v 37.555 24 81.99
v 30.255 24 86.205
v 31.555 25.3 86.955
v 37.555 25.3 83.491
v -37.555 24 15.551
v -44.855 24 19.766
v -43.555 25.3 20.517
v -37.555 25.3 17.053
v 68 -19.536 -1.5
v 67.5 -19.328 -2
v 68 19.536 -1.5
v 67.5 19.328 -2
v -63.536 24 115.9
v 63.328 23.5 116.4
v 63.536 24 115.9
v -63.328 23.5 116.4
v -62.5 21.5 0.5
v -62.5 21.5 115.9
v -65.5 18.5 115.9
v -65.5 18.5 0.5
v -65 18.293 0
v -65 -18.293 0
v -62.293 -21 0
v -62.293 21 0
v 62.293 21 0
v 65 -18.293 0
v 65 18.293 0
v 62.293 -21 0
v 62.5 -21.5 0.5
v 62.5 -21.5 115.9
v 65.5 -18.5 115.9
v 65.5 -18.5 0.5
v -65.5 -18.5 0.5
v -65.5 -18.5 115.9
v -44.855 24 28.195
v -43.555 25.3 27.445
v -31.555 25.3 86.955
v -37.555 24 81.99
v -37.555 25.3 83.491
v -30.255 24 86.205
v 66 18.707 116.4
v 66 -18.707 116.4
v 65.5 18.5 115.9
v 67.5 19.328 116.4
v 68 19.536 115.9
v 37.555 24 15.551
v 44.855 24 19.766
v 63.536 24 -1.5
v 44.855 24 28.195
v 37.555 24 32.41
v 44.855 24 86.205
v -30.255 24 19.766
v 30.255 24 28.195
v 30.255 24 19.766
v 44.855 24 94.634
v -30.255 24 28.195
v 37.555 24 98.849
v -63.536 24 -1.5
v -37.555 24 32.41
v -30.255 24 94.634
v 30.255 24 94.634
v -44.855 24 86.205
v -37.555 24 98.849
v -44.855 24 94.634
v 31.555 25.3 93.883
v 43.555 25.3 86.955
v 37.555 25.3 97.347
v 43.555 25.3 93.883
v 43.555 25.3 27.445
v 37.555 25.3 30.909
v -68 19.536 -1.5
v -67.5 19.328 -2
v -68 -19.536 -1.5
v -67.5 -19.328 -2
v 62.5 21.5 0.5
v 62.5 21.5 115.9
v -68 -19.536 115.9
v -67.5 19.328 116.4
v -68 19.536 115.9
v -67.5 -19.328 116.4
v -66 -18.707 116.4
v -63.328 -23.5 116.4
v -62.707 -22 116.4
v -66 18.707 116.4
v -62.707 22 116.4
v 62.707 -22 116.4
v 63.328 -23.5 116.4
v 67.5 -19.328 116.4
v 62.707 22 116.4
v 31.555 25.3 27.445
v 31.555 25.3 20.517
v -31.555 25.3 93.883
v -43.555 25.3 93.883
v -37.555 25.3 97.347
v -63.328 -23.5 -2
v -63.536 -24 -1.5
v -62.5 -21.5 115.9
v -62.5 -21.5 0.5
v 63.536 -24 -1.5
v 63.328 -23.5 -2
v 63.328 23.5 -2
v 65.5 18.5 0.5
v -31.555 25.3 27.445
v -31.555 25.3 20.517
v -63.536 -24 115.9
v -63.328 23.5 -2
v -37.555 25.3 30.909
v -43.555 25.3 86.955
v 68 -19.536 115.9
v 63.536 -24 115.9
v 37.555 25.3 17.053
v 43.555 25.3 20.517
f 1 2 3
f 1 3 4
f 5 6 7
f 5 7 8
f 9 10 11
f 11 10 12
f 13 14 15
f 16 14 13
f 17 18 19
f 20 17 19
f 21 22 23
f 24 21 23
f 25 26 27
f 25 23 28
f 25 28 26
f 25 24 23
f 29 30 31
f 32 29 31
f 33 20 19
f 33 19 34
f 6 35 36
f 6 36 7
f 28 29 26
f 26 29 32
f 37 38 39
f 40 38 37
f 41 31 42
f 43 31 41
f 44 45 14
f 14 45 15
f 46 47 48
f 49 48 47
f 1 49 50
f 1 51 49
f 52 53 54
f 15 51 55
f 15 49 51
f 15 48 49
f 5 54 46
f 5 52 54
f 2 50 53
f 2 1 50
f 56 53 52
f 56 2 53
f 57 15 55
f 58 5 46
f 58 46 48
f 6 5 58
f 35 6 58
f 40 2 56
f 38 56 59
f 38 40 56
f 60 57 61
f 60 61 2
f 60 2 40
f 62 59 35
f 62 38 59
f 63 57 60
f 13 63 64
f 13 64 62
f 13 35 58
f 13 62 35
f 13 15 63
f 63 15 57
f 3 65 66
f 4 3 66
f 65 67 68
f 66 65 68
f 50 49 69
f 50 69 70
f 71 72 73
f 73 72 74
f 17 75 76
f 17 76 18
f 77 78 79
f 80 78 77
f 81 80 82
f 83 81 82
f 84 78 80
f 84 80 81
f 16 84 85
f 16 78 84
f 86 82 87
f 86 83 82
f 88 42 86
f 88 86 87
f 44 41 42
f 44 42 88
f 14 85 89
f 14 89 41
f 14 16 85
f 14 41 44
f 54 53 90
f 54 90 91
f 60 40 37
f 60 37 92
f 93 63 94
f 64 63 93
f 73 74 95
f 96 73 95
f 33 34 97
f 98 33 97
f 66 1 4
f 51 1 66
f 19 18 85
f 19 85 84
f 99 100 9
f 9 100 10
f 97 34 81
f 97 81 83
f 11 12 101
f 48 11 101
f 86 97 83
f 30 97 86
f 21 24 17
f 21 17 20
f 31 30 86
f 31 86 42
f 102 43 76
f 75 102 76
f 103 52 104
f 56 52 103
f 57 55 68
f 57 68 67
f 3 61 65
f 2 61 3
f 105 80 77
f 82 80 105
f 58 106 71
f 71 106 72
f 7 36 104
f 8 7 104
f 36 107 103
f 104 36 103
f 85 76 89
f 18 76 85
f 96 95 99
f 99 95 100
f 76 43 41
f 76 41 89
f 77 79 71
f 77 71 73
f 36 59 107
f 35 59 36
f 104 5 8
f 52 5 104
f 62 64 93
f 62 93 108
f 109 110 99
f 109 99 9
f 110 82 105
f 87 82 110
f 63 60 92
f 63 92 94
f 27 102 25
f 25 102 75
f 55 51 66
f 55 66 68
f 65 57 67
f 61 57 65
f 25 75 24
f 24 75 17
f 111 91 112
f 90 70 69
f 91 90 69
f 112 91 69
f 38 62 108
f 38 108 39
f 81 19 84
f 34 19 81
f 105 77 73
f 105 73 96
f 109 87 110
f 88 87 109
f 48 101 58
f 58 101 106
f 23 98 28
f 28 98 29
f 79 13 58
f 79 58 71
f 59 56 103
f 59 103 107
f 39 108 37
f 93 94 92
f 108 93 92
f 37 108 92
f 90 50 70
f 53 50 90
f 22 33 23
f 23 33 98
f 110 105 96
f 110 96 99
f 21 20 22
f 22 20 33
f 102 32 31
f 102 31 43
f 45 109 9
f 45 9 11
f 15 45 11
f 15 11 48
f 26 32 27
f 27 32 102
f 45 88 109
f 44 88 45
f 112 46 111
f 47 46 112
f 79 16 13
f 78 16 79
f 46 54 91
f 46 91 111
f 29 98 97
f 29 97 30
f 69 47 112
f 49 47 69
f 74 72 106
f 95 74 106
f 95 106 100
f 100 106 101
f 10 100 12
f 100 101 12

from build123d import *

# Parameters (mm, degrees)
WALLS_DEPTH          = 116.4
BACK_PLATE_DEPTH     = 2
DEBURS_SIZE          = 0.5
FEET_DEPTH           = 1.3
FEET_DRAFT           = -45
FEET_PROFILE_2_DEPTH = 1.3
FEET_PROFILE_2_DRAFT = -45
FEET_PROFILE_3_DEPTH = 1.3
FEET_PROFILE_3_DRAFT = -45
FEET_PROFILE_4_DEPTH = 1.3
FEET_PROFILE_4_DRAFT = -45


with BuildPart() as part:
    # Sketch1 → Walls (new body)
    with BuildSketch(Plane.XY):
        Polygon((-68, 19.535533906), (-68, -19.535533906), (-63.535533906, -24), (63.535533906, -24), (68, -19.535533906), (68, 19.535533906), (63.535533906, 24), (-63.535533906, 24), align=None)
        Polygon((-65.5, 18.5), (-65.5, -18.5), (-62.5, -21.5), (62.5, -21.5), (65.5, -18.5), (65.5, 18.5), (62.5, 21.5), (-62.5, 21.5), align=None, mode=Mode.SUBTRACT)
    extrude(amount=WALLS_DEPTH)

    # Sketch2 → Back Plate (add)
    with BuildSketch(Plane.XY):
        Polygon((68, -19.535533906), (68, 19.535533906), (63.535533906, 24), (-63.535533906, 24), (-68, 19.535533906), (-68, -19.535533906), (-63.535533906, -24), (63.535533906, -24), align=None)
    extrude(amount=-BACK_PLATE_DEPTH)

    # Deburs
    deburs_edges = [part.edges().sort_by_distance(p)[0] for p in [
        (65.5, 0, 0),
        (64, 20, 0),
        (0, 21.5, 0),
        (-64, 20, 0),
        (-65.5, 0, 0),
        (-64, -20, 0),
        (0, -24, 116.4),
        (65.767766953, -21.767766953, 116.4),
        (68, 0, 116.4),
        (65.767766953, -21.767766953, -2),
        (0, -24, -2),
        (-65.767766953, -21.767766953, -2),
        (-68, 0, -2),
        (-65.767766953, 21.767766953, -2),
        (0, 24, -2),
        (65.767766953, 21.767766953, -2),
        (68, 0, -2),
        (65.767766953, 21.767766953, 116.4),
        (0, 24, 116.4),
        (-65.767766953, 21.767766953, 116.4),
        (-68, 0, 116.4),
        (-65.767766953, -21.767766953, 116.4),
        (0, -21.5, 0),
        (0, -21.5, 116.4),
        (-64, -20, 116.4),
        (-65.5, 0, 116.4),
        (-64, 20, 116.4),
        (0, 21.5, 116.4),
        (64, 20, 116.4),
        (65.5, 0, 116.4),
        (64, -20, 116.4),
        (64, -20, 0),
    ]]
    chamfer(deburs_edges, length=DEBURS_SIZE)


with BuildPart() as feet_tool:
    # Sketch4 → Feet (with draft: the straight prism first)
    with BuildSketch(Plane.XZ.offset(-24)):
        Polygon((-30.254771792, 94.633894852), (-37.554771792, 98.848551817), (-44.854771792, 94.633894852), (-44.854771792, 86.204580921), (-37.554771792, 81.989923956), (-30.254771792, 86.204580921), align=None)
    extrude(amount=-FEET_DEPTH)
    # Feet: the draft: its side faces are tilted about the plane it starts from
    feet_sides = [feet_tool.faces().sort_by_distance(p)[0] for p in [
        (-33.904771792, 24.65, 96.741223334),
        (-41.204771792, 24.65, 96.741223334),
        (-44.854771792, 24.65, 90.419237886),
        (-41.204771792, 24.65, 84.097252439),
        (-33.904771792, 24.65, 84.097252439),
        (-30.254771792, 24.65, 90.419237886),
    ]]
    draft(feet_sides, Plane.XZ.offset(-24), FEET_DRAFT)


with BuildPart() as part_1:
    add(part.part)

    # Feet: add feet_tool
    add(feet_tool.part)


with BuildPart() as feet_profile_2_tool:
    # Sketch4 → Feet profile 2 (with draft: the straight prism first)
    with BuildSketch(Plane.XZ.offset(-24)):
        Polygon((-37.554771792, 32.410076044), (-44.854771792, 28.195419079), (-44.854771792, 19.766105148), (-37.554771792, 15.551448183), (-30.254771792, 19.766105148), (-30.254771792, 28.195419079), align=None)
    extrude(amount=-FEET_PROFILE_2_DEPTH)
    # Feet profile 2: the draft: its side faces are tilted about the plane it starts from
    feet_profile_2_sides = [feet_profile_2_tool.faces().sort_by_distance(p)[0] for p in [
        (-41.204771792, 24.65, 30.302747561),
        (-44.854771792, 24.65, 23.980762114),
        (-41.204771792, 24.65, 17.658776666),
        (-33.904771792, 24.65, 17.658776666),
        (-30.254771792, 24.65, 23.980762114),
        (-33.904771792, 24.65, 30.302747561),
    ]]
    draft(feet_profile_2_sides, Plane.XZ.offset(-24), FEET_PROFILE_2_DRAFT)


with BuildPart() as part_2:
    add(part_1.part)

    # Feet profile 2: add feet_profile_2_tool
    add(feet_profile_2_tool.part)


with BuildPart() as feet_profile_3_tool:
    # Sketch4 → Feet profile 3 (with draft: the straight prism first)
    with BuildSketch(Plane.XZ.offset(-24)):
        Polygon((37.554771792, 98.848551817), (30.254771792, 94.633894852), (30.254771792, 86.204580921), (37.554771792, 81.989923956), (44.854771792, 86.204580921), (44.854771792, 94.633894852), align=None)
    extrude(amount=-FEET_PROFILE_3_DEPTH)
    # Feet profile 3: the draft: its side faces are tilted about the plane it starts from
    feet_profile_3_sides = [feet_profile_3_tool.faces().sort_by_distance(p)[0] for p in [
        (33.904771792, 24.65, 96.741223334),
        (30.254771792, 24.65, 90.419237886),
        (33.904771792, 24.65, 84.097252439),
        (41.204771792, 24.65, 84.097252439),
        (44.854771792, 24.65, 90.419237886),
        (41.204771792, 24.65, 96.741223334),
    ]]
    draft(feet_profile_3_sides, Plane.XZ.offset(-24), FEET_PROFILE_3_DRAFT)


with BuildPart() as part_3:
    add(part_2.part)

    # Feet profile 3: add feet_profile_3_tool
    add(feet_profile_3_tool.part)


with BuildPart() as feet_profile_4_tool:
    # Sketch4 → Feet profile 4 (with draft: the straight prism first)
    with BuildSketch(Plane.XZ.offset(-24)):
        Polygon((44.854771792, 19.766105148), (44.854771792, 28.195419079), (37.554771792, 32.410076044), (30.254771792, 28.195419079), (30.254771792, 19.766105148), (37.554771792, 15.551448183), align=None)
    extrude(amount=-FEET_PROFILE_4_DEPTH)
    # Feet profile 4: the draft: its side faces are tilted about the plane it starts from
    feet_profile_4_sides = [feet_profile_4_tool.faces().sort_by_distance(p)[0] for p in [
        (44.854771792, 24.65, 23.980762114),
        (41.204771792, 24.65, 30.302747561),
        (33.904771792, 24.65, 30.302747561),
        (30.254771792, 24.65, 23.980762114),
        (33.904771792, 24.65, 17.658776666),
        (41.204771792, 24.65, 17.658776666),
    ]]
    draft(feet_profile_4_sides, Plane.XZ.offset(-24), FEET_PROFILE_4_DRAFT)


with BuildPart() as part_4:
    add(part_3.part)

    # Feet profile 4: add feet_profile_4_tool
    add(feet_profile_4_tool.part)


solid = part_4.part
